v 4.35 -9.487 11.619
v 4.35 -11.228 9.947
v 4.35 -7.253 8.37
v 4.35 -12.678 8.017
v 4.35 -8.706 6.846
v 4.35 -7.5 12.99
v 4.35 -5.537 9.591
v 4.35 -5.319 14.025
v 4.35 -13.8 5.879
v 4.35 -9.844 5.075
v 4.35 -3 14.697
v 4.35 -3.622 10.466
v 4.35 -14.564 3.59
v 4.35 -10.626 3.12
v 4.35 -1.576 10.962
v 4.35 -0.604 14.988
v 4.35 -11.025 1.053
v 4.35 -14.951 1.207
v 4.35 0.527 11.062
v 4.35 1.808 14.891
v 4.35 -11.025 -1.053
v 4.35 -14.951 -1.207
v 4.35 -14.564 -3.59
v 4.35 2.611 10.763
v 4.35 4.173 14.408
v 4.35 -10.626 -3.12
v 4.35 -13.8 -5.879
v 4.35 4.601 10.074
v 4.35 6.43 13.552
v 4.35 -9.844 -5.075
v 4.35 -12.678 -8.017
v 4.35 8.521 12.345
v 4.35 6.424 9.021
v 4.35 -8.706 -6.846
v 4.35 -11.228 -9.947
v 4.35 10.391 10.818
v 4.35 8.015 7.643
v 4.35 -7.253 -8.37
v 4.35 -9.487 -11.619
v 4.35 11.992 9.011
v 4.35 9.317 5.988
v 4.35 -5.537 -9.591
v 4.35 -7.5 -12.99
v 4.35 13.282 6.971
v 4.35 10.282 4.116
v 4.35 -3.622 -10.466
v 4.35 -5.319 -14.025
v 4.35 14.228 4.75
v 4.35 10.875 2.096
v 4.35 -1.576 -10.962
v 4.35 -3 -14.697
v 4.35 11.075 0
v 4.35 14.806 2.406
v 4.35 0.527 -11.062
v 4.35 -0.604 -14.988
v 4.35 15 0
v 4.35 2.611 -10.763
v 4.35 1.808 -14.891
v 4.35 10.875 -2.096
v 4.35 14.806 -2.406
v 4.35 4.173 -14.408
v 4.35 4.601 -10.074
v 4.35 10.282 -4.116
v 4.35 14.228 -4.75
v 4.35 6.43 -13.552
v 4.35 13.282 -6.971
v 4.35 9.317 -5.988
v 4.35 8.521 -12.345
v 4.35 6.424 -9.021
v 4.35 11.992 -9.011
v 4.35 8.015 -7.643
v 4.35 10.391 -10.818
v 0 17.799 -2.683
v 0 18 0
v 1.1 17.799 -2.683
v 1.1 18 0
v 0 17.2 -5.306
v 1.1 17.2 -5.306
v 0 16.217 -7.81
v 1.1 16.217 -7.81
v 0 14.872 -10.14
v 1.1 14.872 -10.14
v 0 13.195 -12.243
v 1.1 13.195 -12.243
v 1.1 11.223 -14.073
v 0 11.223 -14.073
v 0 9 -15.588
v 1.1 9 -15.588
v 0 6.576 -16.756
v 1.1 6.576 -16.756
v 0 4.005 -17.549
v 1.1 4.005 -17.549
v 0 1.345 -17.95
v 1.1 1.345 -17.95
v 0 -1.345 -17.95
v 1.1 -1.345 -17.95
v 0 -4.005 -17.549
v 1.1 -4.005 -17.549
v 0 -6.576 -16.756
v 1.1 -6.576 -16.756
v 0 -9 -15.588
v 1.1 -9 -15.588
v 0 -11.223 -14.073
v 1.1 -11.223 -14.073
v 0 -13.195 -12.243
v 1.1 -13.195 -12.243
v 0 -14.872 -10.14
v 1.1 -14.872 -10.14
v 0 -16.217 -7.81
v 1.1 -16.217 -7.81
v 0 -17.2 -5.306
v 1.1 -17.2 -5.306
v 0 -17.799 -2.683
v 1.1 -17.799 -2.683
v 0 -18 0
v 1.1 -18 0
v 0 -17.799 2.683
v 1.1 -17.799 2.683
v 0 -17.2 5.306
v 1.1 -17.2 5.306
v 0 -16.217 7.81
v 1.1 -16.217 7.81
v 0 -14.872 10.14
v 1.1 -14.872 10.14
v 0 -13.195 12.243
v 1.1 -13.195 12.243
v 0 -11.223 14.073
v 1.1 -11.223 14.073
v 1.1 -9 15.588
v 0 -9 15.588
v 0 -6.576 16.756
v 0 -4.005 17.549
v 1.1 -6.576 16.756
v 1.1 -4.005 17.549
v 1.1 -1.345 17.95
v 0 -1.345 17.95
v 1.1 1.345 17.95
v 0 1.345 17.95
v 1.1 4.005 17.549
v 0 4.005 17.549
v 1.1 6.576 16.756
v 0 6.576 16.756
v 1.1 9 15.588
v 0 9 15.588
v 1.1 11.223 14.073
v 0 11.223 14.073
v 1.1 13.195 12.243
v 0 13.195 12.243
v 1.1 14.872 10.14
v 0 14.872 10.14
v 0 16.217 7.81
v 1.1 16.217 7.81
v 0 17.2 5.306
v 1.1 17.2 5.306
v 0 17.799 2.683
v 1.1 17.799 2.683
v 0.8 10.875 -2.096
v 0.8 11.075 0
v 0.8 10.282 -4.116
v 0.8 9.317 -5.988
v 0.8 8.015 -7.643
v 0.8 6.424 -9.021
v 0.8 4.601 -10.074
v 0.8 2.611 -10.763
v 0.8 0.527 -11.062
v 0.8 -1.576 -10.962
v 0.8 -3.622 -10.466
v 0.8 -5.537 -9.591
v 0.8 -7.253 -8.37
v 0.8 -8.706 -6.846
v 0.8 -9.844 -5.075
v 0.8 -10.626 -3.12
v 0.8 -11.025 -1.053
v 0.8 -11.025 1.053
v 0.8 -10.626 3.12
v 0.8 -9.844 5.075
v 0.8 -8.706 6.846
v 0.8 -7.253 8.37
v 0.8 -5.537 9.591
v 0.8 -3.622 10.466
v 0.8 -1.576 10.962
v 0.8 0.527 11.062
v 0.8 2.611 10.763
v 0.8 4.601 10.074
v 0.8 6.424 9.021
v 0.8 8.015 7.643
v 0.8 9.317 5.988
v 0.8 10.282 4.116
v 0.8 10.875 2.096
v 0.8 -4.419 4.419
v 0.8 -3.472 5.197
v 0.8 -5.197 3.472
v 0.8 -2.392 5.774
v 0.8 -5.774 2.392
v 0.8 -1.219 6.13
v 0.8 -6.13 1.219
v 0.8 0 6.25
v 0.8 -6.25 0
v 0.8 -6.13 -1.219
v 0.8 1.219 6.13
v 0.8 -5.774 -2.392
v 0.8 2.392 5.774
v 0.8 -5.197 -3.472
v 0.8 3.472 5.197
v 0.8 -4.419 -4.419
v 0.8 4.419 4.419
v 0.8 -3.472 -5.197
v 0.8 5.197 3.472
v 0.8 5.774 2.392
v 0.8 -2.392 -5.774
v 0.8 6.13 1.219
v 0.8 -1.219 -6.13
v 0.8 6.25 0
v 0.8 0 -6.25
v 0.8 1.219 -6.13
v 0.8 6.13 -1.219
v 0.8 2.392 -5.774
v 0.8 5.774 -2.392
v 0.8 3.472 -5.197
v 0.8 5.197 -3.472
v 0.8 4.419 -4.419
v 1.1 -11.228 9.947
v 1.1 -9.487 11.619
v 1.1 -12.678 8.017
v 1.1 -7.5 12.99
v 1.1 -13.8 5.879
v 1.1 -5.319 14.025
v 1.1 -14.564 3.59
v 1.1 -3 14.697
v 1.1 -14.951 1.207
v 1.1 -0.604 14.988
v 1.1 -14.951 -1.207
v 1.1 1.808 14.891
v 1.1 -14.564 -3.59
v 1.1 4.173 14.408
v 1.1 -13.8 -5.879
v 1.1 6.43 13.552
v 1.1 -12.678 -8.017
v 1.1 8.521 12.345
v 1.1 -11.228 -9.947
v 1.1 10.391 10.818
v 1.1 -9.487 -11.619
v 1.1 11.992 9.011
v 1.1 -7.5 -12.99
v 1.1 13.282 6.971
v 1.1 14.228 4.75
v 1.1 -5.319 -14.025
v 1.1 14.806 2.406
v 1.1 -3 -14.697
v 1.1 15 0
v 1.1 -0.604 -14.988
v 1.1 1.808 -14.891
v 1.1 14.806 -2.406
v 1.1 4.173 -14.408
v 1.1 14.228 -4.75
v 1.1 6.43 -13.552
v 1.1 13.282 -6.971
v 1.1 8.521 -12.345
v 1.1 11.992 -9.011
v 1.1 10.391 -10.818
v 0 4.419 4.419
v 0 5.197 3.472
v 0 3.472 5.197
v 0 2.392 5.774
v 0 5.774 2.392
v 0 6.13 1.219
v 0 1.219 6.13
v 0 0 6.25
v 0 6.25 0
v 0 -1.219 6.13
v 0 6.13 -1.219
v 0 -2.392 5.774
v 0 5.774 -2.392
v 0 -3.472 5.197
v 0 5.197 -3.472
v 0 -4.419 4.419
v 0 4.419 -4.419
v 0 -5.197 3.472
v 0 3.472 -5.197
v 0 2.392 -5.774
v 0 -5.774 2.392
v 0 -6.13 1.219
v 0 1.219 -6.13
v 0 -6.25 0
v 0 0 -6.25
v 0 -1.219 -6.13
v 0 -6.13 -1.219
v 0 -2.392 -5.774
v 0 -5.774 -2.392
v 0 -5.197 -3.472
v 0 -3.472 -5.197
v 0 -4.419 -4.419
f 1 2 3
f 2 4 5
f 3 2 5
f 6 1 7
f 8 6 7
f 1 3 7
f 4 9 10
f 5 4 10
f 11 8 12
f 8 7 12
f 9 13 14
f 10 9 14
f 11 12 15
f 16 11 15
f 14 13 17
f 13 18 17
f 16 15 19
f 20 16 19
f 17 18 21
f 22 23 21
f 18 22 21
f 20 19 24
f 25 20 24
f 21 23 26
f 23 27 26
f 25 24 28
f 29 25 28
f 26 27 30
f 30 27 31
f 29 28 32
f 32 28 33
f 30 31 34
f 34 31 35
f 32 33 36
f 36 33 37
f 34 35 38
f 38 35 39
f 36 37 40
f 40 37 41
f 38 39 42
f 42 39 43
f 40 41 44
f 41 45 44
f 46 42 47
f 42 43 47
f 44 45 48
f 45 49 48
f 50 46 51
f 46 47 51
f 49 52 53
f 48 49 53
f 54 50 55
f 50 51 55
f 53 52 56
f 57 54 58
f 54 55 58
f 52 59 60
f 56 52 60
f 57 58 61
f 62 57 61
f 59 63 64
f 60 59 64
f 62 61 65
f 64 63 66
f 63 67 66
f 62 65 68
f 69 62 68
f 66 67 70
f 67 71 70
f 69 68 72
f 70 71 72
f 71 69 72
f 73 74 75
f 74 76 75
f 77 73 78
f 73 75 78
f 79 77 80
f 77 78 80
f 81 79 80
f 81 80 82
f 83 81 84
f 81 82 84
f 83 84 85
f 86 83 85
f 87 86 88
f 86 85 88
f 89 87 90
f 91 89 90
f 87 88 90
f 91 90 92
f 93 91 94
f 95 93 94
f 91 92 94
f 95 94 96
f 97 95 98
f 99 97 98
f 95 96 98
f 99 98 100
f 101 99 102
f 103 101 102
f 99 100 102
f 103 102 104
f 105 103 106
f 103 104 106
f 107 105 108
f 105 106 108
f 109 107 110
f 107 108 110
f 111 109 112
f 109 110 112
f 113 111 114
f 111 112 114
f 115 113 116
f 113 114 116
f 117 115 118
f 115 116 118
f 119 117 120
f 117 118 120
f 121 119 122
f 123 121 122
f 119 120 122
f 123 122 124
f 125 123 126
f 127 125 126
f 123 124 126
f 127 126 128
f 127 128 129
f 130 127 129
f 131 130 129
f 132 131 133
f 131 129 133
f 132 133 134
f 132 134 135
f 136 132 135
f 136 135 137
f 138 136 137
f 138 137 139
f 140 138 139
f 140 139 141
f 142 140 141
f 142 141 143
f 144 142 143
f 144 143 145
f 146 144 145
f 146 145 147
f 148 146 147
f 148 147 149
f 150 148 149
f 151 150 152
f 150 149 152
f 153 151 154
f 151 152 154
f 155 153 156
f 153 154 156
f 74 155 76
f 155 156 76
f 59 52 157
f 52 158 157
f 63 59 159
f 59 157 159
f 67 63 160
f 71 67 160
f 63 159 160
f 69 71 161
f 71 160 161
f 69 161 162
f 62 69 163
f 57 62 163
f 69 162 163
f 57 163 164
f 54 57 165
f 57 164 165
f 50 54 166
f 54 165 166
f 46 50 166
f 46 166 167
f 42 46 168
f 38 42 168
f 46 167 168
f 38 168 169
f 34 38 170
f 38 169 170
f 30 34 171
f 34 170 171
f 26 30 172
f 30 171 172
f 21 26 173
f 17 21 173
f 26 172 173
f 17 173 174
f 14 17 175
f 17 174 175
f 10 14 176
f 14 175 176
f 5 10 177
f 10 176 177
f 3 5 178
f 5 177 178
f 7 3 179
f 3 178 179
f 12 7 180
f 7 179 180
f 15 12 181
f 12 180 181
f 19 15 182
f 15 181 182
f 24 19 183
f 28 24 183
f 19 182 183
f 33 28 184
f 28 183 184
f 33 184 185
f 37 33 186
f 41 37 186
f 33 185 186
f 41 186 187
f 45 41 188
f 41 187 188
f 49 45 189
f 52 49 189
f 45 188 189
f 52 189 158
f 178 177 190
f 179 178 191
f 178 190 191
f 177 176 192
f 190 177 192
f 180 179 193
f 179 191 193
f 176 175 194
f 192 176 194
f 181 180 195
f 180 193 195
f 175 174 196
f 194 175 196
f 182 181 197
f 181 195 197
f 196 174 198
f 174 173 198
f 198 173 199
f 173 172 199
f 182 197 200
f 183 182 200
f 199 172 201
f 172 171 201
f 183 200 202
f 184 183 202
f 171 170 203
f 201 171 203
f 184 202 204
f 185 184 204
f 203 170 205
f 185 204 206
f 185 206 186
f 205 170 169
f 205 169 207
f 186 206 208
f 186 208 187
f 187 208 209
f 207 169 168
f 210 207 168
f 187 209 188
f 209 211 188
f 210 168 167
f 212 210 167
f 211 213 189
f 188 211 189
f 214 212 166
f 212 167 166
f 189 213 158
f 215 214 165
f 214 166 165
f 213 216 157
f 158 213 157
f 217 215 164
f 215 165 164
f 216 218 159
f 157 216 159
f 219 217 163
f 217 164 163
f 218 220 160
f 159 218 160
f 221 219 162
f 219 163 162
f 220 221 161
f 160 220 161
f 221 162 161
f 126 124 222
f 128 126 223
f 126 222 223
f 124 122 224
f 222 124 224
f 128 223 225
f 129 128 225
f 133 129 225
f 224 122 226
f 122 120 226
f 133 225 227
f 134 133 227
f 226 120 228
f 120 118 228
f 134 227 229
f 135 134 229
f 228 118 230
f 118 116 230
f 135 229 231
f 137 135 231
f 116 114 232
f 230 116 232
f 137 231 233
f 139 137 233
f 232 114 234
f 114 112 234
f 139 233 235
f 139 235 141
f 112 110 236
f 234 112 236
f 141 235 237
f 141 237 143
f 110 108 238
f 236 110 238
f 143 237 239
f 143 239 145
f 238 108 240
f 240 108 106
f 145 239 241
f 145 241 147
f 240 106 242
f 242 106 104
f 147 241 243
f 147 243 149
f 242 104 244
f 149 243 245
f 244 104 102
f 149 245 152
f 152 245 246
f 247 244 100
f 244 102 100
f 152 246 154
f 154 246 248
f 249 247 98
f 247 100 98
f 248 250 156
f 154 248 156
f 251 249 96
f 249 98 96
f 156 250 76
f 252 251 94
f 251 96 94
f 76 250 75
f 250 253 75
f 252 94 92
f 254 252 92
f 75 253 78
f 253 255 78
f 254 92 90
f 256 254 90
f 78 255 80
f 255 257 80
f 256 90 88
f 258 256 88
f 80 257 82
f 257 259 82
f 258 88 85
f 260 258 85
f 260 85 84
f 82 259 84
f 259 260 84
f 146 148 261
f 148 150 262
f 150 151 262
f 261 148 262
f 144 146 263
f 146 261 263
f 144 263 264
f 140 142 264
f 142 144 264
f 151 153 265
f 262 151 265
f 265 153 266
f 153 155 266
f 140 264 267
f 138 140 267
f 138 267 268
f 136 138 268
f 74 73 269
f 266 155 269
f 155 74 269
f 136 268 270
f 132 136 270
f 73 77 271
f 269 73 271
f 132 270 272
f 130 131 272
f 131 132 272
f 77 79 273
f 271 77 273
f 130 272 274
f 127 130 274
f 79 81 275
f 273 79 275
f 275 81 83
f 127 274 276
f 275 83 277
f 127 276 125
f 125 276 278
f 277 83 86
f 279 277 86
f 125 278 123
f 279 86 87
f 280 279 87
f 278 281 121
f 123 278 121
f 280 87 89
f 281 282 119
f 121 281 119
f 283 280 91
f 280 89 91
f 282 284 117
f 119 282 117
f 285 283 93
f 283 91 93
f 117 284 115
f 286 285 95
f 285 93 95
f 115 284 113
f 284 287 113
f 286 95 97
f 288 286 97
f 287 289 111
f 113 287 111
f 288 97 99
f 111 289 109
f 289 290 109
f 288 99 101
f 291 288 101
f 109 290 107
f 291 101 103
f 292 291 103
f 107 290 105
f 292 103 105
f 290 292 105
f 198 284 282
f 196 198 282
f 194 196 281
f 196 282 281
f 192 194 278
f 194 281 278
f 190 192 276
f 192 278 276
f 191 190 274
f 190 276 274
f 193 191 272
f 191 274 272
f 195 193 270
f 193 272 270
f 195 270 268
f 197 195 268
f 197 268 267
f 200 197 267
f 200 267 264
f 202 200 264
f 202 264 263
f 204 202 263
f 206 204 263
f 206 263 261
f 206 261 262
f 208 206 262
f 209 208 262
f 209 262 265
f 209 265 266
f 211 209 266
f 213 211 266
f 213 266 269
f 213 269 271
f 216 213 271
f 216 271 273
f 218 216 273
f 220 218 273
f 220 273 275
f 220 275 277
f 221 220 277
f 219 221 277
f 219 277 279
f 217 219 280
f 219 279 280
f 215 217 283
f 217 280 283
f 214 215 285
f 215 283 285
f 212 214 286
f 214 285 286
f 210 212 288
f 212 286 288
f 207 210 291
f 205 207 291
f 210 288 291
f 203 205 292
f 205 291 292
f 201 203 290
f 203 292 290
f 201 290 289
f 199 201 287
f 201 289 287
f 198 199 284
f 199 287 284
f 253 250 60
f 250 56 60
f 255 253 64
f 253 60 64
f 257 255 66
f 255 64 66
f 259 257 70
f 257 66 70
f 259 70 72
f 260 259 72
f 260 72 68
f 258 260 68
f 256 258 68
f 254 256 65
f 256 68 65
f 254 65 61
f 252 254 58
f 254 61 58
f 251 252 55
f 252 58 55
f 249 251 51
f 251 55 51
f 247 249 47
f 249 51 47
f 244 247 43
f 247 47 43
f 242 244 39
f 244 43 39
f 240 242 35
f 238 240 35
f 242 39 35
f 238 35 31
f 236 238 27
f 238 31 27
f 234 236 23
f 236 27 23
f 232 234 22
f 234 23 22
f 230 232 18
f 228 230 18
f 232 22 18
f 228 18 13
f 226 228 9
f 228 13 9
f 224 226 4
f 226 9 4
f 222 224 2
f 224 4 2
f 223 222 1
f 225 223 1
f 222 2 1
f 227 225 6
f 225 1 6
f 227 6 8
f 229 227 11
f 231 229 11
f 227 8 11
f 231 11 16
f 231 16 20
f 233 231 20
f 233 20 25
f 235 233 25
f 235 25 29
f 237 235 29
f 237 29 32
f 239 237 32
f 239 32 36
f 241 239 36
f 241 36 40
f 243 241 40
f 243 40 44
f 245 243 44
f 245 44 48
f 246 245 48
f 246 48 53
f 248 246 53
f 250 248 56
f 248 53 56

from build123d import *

# Parameters (mm, degrees)
SKIZZE2_R                       = 6.25
SCHNITT_LINEAR_AUSTRAGEN1_DEPTH = 26.824842691


with BuildPart() as part:
    # Skizze1 → Rotation2 (revolve)
    with BuildSketch(Plane.XY):
        Polygon((0, 0), (0, 18), (1.1, 18), (1.1, 15), (4.35, 15), (4.35, 11.075), (0.8, 11.075), (0.8, 0), align=None)
    revolve(axis=Axis((0.8, 0, 0), (-1, 0, 0)))

    # Skizze2 → Schnitt-Linear austragen1 (cut, through all)
    with BuildSketch(Plane.ZY):
        with Locations(Location((0, 0, 0), (0, 0, 270))):
            Circle(SKIZZE2_R)
    extrude(amount=-SCHNITT_LINEAR_AUSTRAGEN1_DEPTH, mode=Mode.SUBTRACT)


solid = part.part
